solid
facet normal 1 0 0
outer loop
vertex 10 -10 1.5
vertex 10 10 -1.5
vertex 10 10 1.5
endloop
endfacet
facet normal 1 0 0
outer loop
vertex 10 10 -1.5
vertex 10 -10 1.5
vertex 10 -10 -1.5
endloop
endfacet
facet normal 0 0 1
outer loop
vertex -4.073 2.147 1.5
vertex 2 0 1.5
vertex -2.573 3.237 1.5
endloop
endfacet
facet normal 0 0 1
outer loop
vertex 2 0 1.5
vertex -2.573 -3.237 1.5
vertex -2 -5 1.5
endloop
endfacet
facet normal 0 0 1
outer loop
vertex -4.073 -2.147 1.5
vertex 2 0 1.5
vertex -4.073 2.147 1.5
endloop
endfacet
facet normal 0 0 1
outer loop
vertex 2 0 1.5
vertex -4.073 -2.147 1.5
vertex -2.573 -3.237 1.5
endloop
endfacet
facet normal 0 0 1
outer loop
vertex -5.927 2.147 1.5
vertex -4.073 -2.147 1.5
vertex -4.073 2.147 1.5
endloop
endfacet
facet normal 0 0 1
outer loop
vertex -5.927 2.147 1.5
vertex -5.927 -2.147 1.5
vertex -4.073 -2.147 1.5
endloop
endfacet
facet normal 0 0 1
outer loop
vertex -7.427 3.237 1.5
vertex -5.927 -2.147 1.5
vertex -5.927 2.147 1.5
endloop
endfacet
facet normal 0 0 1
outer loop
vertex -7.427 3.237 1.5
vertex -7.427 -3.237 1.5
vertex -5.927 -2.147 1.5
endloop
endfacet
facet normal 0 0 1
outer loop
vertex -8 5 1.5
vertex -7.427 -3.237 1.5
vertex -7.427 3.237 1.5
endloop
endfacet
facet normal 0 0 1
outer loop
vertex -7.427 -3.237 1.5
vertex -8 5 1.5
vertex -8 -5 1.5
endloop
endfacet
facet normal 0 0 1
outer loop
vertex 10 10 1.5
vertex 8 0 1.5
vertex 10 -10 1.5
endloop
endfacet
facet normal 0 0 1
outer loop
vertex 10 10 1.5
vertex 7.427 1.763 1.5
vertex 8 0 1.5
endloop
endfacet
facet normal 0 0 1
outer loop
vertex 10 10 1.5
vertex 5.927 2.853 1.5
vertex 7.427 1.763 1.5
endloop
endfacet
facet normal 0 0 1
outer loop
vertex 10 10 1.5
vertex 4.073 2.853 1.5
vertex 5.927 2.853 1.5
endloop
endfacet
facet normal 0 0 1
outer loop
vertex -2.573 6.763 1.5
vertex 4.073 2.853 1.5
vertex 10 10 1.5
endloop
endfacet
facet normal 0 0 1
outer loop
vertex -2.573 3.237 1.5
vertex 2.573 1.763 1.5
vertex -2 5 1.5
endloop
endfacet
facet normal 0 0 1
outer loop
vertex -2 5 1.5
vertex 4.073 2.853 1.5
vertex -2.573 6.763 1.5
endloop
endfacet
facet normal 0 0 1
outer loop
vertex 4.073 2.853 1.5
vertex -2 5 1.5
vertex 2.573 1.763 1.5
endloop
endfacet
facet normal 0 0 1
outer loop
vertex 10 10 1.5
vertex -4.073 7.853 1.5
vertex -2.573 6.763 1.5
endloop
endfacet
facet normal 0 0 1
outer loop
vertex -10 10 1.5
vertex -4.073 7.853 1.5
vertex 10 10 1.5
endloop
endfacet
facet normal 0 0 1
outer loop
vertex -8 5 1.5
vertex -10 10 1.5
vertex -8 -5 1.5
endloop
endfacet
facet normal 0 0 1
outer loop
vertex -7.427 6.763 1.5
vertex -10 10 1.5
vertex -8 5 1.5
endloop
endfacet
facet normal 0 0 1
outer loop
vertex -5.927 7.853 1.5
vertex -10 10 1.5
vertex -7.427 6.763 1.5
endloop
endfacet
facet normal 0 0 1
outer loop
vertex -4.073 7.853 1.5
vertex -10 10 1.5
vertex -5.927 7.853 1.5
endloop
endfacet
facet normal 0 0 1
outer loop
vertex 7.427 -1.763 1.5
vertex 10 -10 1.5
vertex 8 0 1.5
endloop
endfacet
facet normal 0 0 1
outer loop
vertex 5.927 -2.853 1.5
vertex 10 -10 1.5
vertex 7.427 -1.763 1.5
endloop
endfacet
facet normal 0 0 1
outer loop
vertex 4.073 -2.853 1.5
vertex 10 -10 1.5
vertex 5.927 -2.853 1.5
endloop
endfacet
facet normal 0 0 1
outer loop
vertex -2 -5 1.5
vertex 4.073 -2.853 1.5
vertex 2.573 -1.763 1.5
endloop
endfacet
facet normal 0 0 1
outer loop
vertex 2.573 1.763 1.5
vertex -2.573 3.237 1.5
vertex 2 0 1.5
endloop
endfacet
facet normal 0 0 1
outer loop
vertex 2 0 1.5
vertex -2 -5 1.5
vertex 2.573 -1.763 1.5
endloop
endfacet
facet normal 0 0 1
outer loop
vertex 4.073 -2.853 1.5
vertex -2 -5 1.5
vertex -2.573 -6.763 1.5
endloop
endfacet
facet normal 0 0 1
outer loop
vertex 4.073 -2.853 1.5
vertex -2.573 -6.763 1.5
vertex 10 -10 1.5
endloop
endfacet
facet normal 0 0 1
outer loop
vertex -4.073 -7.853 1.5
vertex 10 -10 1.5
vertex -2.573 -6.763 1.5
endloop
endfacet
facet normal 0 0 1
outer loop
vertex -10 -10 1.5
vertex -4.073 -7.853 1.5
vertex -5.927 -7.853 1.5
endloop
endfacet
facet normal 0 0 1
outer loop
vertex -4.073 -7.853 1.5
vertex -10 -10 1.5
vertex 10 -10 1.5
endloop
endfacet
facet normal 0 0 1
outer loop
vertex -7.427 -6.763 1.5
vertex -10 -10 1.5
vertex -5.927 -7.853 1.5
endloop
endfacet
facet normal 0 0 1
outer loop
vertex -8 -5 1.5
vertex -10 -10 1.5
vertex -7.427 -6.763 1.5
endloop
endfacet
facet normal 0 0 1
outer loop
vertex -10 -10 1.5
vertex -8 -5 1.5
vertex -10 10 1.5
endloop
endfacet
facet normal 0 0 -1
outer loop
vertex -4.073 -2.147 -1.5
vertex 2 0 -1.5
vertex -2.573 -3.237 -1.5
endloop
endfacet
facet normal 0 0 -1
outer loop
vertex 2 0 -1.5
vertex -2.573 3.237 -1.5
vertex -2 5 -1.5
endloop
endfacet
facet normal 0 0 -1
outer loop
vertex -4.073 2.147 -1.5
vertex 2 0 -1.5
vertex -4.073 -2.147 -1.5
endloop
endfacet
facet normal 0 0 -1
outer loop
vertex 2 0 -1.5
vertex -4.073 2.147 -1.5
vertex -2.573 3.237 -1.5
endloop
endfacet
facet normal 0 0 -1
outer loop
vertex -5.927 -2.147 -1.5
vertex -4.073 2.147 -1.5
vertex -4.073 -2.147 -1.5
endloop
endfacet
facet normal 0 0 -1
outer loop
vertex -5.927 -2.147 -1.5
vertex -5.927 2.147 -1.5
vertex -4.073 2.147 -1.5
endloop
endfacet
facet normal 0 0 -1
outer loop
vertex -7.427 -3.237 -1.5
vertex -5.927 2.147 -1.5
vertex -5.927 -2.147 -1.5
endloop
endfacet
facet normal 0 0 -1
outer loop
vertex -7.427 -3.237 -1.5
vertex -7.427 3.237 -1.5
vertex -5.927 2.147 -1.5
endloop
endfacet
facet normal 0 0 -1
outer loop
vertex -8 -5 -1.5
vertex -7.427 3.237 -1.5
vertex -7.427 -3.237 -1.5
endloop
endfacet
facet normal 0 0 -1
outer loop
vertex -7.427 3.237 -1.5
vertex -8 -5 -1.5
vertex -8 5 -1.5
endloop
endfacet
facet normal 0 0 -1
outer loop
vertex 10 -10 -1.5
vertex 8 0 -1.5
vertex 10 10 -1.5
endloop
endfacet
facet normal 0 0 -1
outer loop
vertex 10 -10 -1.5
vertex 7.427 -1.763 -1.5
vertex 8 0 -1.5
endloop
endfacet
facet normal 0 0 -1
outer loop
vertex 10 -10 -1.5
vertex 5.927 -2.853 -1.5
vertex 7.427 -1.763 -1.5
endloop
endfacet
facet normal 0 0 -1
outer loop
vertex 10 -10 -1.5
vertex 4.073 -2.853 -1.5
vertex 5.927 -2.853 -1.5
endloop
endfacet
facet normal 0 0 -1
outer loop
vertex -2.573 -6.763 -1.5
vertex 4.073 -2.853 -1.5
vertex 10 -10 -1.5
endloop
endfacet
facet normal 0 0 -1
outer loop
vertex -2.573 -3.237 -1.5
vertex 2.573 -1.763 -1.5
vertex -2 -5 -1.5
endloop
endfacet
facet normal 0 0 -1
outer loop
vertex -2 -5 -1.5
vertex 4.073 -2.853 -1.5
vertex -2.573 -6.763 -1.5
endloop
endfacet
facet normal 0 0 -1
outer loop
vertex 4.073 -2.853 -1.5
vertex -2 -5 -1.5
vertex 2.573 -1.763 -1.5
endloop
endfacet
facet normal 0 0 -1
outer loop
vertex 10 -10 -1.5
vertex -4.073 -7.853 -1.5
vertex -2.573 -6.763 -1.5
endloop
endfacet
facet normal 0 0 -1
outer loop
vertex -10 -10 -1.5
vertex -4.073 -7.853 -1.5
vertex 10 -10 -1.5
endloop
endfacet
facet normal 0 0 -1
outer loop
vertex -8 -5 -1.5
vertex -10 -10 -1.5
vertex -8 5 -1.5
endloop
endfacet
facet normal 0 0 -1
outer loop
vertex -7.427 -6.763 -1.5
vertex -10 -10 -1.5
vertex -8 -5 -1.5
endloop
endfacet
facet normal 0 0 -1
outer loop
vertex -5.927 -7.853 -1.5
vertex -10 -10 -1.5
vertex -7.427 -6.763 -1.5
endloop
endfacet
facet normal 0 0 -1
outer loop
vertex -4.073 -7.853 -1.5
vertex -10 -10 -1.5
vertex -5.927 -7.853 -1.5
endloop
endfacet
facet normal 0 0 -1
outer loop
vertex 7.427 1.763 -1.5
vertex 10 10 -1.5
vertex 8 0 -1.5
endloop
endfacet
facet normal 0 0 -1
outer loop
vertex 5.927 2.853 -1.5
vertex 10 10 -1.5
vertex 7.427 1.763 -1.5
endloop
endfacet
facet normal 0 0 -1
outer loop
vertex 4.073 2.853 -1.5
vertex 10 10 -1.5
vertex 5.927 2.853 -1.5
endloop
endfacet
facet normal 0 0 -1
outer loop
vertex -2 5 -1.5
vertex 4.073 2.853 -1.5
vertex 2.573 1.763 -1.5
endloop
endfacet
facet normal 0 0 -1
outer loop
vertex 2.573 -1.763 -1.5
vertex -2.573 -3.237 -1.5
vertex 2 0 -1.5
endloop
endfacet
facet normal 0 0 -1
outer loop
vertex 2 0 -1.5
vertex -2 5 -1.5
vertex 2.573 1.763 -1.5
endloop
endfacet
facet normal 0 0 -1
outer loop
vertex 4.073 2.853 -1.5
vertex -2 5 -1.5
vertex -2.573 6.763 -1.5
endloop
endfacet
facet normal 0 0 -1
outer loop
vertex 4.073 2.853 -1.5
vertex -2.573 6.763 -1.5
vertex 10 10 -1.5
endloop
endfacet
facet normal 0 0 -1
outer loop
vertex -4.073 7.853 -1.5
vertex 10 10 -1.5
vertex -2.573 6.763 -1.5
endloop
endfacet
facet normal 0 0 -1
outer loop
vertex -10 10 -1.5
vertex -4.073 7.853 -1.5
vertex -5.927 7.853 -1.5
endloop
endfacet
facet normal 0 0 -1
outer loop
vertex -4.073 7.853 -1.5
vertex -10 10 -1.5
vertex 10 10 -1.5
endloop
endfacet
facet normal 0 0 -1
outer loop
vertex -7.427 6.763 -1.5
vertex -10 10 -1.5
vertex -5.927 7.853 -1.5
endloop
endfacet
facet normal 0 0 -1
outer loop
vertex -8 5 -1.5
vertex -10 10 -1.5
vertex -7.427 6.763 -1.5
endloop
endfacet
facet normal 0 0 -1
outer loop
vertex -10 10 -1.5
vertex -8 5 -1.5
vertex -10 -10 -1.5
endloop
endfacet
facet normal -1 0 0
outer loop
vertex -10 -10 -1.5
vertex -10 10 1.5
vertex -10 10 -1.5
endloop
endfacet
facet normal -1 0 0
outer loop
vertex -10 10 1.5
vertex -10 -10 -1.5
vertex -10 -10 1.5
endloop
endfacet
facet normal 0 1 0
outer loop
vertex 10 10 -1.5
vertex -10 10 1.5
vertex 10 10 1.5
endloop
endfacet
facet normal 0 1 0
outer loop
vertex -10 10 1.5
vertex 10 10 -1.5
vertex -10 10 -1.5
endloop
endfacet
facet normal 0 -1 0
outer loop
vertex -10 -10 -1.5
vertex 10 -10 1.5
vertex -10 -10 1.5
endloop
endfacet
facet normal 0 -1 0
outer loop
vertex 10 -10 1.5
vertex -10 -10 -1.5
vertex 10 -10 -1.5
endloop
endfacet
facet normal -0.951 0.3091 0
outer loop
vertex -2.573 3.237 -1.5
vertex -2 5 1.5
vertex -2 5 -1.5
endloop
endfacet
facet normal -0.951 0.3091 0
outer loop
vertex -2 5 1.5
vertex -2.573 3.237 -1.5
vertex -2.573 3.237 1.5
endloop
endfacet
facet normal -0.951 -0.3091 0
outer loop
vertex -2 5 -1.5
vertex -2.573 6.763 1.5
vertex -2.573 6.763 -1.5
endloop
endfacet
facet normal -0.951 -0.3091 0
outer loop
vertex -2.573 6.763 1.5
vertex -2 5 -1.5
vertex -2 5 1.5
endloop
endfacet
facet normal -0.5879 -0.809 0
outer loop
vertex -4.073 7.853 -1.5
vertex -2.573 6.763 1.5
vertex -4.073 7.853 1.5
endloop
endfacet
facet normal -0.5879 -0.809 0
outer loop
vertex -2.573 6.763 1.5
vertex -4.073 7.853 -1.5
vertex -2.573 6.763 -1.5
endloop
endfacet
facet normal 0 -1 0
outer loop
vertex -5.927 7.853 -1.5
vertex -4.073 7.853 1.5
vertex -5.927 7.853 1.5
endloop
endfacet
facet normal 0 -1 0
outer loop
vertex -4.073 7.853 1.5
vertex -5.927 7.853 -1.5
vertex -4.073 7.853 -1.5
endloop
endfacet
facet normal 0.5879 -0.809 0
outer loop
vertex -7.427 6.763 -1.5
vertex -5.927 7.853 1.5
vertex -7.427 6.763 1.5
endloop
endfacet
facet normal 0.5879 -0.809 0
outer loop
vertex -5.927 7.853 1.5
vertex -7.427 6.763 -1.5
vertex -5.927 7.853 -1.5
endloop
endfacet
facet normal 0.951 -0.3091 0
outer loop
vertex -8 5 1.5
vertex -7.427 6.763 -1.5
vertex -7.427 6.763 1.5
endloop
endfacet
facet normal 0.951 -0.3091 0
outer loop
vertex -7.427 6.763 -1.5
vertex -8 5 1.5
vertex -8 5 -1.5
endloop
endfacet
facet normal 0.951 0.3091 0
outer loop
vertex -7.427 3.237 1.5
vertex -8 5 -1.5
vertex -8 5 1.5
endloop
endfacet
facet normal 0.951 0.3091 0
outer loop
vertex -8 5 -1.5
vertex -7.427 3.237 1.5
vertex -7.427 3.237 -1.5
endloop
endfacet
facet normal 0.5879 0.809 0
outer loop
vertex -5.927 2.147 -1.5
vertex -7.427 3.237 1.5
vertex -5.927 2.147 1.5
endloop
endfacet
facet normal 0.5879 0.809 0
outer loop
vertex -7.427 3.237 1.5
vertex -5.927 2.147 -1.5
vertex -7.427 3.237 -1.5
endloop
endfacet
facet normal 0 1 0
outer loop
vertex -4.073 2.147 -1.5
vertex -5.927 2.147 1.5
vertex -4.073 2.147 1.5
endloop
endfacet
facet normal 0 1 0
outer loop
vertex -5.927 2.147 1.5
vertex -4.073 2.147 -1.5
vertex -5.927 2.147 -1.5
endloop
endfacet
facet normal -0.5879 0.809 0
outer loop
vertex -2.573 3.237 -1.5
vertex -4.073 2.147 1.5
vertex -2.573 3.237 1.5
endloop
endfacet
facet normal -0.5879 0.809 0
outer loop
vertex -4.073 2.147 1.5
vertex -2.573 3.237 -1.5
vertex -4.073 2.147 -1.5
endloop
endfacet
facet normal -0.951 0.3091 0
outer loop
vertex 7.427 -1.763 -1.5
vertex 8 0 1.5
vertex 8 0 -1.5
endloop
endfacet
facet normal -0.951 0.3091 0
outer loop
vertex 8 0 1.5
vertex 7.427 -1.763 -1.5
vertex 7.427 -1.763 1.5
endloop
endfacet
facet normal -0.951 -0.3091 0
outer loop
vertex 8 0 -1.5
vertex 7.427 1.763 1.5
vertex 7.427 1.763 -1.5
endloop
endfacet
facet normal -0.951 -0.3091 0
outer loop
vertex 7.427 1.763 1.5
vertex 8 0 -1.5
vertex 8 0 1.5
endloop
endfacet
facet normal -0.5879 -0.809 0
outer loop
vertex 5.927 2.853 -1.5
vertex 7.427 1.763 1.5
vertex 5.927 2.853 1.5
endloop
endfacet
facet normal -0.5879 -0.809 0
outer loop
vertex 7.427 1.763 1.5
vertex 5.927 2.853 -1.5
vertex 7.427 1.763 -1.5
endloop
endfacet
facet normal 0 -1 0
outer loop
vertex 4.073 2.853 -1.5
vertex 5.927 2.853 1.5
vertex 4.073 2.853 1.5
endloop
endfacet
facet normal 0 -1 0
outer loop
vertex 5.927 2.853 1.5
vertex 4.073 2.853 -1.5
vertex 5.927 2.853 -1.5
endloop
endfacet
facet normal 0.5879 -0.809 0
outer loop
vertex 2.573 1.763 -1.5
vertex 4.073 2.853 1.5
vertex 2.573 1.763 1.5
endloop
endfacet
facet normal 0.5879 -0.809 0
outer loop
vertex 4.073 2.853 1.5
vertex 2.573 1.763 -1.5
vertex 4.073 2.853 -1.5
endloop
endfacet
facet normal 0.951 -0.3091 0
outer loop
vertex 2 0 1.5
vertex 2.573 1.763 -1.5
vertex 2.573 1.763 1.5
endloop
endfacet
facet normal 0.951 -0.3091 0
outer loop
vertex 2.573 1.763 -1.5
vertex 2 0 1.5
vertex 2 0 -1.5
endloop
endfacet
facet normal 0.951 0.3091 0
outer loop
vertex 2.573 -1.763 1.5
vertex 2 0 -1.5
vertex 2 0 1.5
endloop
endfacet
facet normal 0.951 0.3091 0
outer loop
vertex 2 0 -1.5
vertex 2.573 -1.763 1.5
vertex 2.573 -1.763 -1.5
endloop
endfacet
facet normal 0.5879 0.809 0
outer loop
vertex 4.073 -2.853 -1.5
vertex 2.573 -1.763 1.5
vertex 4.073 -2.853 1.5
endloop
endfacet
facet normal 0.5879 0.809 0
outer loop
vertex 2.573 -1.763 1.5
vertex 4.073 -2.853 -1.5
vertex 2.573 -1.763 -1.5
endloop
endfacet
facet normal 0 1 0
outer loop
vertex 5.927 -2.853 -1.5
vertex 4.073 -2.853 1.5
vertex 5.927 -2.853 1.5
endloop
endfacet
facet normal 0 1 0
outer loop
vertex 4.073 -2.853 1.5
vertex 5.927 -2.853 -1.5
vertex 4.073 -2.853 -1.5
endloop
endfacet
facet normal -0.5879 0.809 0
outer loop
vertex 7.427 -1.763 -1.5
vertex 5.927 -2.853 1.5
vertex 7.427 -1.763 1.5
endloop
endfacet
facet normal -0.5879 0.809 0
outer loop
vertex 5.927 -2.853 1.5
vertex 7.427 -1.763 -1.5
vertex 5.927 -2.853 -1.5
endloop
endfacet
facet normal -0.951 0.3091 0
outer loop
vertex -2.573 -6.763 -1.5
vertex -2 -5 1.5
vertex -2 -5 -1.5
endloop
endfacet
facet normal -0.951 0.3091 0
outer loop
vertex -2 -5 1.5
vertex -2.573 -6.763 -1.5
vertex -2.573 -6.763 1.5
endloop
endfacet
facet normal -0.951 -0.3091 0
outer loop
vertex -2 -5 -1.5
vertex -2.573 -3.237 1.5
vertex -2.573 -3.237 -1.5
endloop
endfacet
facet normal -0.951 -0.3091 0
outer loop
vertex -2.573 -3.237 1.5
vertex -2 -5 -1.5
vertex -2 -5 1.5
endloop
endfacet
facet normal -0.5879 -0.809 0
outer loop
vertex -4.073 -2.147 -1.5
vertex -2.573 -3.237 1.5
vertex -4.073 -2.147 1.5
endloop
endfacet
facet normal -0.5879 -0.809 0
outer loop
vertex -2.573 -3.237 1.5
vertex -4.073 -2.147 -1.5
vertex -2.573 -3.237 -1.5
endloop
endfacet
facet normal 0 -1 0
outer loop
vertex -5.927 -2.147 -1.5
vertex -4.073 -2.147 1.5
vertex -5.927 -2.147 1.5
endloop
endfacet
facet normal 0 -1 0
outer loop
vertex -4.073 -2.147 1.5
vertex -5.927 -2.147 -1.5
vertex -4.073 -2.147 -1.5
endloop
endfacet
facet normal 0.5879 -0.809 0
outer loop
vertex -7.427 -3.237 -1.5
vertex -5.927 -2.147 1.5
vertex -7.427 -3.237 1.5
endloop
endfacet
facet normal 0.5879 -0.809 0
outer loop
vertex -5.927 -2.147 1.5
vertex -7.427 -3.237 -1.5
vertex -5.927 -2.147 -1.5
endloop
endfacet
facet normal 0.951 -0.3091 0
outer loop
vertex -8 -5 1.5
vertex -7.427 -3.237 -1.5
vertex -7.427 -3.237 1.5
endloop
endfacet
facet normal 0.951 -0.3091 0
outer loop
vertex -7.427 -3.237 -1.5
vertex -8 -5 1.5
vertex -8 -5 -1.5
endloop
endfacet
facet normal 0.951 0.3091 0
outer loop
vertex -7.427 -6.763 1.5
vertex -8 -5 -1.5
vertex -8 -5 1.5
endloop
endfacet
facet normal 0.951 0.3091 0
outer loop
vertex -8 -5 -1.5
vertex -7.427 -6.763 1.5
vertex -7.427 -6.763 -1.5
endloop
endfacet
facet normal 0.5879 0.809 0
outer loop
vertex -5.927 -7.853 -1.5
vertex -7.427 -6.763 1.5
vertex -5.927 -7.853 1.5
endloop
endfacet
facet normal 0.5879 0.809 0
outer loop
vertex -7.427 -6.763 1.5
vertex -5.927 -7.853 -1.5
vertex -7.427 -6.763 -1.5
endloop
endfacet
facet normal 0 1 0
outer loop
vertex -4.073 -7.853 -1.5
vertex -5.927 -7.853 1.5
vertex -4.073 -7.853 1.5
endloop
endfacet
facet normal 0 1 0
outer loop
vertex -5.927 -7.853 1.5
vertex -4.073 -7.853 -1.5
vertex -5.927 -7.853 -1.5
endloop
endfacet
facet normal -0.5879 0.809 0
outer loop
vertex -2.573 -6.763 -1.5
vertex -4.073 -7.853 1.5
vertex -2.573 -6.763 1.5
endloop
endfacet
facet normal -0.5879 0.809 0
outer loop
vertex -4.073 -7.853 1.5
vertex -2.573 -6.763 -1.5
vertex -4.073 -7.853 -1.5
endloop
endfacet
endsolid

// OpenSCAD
difference() {
    cube([20,20,3], center=true);

    linear_extrude(height=60, center=true, convexity=2) {
        translate([5,0]) circle(r=3);
        translate([-5,5]) circle(r=3);
        translate([-5,-5]) circle(r=3);
    }
}
